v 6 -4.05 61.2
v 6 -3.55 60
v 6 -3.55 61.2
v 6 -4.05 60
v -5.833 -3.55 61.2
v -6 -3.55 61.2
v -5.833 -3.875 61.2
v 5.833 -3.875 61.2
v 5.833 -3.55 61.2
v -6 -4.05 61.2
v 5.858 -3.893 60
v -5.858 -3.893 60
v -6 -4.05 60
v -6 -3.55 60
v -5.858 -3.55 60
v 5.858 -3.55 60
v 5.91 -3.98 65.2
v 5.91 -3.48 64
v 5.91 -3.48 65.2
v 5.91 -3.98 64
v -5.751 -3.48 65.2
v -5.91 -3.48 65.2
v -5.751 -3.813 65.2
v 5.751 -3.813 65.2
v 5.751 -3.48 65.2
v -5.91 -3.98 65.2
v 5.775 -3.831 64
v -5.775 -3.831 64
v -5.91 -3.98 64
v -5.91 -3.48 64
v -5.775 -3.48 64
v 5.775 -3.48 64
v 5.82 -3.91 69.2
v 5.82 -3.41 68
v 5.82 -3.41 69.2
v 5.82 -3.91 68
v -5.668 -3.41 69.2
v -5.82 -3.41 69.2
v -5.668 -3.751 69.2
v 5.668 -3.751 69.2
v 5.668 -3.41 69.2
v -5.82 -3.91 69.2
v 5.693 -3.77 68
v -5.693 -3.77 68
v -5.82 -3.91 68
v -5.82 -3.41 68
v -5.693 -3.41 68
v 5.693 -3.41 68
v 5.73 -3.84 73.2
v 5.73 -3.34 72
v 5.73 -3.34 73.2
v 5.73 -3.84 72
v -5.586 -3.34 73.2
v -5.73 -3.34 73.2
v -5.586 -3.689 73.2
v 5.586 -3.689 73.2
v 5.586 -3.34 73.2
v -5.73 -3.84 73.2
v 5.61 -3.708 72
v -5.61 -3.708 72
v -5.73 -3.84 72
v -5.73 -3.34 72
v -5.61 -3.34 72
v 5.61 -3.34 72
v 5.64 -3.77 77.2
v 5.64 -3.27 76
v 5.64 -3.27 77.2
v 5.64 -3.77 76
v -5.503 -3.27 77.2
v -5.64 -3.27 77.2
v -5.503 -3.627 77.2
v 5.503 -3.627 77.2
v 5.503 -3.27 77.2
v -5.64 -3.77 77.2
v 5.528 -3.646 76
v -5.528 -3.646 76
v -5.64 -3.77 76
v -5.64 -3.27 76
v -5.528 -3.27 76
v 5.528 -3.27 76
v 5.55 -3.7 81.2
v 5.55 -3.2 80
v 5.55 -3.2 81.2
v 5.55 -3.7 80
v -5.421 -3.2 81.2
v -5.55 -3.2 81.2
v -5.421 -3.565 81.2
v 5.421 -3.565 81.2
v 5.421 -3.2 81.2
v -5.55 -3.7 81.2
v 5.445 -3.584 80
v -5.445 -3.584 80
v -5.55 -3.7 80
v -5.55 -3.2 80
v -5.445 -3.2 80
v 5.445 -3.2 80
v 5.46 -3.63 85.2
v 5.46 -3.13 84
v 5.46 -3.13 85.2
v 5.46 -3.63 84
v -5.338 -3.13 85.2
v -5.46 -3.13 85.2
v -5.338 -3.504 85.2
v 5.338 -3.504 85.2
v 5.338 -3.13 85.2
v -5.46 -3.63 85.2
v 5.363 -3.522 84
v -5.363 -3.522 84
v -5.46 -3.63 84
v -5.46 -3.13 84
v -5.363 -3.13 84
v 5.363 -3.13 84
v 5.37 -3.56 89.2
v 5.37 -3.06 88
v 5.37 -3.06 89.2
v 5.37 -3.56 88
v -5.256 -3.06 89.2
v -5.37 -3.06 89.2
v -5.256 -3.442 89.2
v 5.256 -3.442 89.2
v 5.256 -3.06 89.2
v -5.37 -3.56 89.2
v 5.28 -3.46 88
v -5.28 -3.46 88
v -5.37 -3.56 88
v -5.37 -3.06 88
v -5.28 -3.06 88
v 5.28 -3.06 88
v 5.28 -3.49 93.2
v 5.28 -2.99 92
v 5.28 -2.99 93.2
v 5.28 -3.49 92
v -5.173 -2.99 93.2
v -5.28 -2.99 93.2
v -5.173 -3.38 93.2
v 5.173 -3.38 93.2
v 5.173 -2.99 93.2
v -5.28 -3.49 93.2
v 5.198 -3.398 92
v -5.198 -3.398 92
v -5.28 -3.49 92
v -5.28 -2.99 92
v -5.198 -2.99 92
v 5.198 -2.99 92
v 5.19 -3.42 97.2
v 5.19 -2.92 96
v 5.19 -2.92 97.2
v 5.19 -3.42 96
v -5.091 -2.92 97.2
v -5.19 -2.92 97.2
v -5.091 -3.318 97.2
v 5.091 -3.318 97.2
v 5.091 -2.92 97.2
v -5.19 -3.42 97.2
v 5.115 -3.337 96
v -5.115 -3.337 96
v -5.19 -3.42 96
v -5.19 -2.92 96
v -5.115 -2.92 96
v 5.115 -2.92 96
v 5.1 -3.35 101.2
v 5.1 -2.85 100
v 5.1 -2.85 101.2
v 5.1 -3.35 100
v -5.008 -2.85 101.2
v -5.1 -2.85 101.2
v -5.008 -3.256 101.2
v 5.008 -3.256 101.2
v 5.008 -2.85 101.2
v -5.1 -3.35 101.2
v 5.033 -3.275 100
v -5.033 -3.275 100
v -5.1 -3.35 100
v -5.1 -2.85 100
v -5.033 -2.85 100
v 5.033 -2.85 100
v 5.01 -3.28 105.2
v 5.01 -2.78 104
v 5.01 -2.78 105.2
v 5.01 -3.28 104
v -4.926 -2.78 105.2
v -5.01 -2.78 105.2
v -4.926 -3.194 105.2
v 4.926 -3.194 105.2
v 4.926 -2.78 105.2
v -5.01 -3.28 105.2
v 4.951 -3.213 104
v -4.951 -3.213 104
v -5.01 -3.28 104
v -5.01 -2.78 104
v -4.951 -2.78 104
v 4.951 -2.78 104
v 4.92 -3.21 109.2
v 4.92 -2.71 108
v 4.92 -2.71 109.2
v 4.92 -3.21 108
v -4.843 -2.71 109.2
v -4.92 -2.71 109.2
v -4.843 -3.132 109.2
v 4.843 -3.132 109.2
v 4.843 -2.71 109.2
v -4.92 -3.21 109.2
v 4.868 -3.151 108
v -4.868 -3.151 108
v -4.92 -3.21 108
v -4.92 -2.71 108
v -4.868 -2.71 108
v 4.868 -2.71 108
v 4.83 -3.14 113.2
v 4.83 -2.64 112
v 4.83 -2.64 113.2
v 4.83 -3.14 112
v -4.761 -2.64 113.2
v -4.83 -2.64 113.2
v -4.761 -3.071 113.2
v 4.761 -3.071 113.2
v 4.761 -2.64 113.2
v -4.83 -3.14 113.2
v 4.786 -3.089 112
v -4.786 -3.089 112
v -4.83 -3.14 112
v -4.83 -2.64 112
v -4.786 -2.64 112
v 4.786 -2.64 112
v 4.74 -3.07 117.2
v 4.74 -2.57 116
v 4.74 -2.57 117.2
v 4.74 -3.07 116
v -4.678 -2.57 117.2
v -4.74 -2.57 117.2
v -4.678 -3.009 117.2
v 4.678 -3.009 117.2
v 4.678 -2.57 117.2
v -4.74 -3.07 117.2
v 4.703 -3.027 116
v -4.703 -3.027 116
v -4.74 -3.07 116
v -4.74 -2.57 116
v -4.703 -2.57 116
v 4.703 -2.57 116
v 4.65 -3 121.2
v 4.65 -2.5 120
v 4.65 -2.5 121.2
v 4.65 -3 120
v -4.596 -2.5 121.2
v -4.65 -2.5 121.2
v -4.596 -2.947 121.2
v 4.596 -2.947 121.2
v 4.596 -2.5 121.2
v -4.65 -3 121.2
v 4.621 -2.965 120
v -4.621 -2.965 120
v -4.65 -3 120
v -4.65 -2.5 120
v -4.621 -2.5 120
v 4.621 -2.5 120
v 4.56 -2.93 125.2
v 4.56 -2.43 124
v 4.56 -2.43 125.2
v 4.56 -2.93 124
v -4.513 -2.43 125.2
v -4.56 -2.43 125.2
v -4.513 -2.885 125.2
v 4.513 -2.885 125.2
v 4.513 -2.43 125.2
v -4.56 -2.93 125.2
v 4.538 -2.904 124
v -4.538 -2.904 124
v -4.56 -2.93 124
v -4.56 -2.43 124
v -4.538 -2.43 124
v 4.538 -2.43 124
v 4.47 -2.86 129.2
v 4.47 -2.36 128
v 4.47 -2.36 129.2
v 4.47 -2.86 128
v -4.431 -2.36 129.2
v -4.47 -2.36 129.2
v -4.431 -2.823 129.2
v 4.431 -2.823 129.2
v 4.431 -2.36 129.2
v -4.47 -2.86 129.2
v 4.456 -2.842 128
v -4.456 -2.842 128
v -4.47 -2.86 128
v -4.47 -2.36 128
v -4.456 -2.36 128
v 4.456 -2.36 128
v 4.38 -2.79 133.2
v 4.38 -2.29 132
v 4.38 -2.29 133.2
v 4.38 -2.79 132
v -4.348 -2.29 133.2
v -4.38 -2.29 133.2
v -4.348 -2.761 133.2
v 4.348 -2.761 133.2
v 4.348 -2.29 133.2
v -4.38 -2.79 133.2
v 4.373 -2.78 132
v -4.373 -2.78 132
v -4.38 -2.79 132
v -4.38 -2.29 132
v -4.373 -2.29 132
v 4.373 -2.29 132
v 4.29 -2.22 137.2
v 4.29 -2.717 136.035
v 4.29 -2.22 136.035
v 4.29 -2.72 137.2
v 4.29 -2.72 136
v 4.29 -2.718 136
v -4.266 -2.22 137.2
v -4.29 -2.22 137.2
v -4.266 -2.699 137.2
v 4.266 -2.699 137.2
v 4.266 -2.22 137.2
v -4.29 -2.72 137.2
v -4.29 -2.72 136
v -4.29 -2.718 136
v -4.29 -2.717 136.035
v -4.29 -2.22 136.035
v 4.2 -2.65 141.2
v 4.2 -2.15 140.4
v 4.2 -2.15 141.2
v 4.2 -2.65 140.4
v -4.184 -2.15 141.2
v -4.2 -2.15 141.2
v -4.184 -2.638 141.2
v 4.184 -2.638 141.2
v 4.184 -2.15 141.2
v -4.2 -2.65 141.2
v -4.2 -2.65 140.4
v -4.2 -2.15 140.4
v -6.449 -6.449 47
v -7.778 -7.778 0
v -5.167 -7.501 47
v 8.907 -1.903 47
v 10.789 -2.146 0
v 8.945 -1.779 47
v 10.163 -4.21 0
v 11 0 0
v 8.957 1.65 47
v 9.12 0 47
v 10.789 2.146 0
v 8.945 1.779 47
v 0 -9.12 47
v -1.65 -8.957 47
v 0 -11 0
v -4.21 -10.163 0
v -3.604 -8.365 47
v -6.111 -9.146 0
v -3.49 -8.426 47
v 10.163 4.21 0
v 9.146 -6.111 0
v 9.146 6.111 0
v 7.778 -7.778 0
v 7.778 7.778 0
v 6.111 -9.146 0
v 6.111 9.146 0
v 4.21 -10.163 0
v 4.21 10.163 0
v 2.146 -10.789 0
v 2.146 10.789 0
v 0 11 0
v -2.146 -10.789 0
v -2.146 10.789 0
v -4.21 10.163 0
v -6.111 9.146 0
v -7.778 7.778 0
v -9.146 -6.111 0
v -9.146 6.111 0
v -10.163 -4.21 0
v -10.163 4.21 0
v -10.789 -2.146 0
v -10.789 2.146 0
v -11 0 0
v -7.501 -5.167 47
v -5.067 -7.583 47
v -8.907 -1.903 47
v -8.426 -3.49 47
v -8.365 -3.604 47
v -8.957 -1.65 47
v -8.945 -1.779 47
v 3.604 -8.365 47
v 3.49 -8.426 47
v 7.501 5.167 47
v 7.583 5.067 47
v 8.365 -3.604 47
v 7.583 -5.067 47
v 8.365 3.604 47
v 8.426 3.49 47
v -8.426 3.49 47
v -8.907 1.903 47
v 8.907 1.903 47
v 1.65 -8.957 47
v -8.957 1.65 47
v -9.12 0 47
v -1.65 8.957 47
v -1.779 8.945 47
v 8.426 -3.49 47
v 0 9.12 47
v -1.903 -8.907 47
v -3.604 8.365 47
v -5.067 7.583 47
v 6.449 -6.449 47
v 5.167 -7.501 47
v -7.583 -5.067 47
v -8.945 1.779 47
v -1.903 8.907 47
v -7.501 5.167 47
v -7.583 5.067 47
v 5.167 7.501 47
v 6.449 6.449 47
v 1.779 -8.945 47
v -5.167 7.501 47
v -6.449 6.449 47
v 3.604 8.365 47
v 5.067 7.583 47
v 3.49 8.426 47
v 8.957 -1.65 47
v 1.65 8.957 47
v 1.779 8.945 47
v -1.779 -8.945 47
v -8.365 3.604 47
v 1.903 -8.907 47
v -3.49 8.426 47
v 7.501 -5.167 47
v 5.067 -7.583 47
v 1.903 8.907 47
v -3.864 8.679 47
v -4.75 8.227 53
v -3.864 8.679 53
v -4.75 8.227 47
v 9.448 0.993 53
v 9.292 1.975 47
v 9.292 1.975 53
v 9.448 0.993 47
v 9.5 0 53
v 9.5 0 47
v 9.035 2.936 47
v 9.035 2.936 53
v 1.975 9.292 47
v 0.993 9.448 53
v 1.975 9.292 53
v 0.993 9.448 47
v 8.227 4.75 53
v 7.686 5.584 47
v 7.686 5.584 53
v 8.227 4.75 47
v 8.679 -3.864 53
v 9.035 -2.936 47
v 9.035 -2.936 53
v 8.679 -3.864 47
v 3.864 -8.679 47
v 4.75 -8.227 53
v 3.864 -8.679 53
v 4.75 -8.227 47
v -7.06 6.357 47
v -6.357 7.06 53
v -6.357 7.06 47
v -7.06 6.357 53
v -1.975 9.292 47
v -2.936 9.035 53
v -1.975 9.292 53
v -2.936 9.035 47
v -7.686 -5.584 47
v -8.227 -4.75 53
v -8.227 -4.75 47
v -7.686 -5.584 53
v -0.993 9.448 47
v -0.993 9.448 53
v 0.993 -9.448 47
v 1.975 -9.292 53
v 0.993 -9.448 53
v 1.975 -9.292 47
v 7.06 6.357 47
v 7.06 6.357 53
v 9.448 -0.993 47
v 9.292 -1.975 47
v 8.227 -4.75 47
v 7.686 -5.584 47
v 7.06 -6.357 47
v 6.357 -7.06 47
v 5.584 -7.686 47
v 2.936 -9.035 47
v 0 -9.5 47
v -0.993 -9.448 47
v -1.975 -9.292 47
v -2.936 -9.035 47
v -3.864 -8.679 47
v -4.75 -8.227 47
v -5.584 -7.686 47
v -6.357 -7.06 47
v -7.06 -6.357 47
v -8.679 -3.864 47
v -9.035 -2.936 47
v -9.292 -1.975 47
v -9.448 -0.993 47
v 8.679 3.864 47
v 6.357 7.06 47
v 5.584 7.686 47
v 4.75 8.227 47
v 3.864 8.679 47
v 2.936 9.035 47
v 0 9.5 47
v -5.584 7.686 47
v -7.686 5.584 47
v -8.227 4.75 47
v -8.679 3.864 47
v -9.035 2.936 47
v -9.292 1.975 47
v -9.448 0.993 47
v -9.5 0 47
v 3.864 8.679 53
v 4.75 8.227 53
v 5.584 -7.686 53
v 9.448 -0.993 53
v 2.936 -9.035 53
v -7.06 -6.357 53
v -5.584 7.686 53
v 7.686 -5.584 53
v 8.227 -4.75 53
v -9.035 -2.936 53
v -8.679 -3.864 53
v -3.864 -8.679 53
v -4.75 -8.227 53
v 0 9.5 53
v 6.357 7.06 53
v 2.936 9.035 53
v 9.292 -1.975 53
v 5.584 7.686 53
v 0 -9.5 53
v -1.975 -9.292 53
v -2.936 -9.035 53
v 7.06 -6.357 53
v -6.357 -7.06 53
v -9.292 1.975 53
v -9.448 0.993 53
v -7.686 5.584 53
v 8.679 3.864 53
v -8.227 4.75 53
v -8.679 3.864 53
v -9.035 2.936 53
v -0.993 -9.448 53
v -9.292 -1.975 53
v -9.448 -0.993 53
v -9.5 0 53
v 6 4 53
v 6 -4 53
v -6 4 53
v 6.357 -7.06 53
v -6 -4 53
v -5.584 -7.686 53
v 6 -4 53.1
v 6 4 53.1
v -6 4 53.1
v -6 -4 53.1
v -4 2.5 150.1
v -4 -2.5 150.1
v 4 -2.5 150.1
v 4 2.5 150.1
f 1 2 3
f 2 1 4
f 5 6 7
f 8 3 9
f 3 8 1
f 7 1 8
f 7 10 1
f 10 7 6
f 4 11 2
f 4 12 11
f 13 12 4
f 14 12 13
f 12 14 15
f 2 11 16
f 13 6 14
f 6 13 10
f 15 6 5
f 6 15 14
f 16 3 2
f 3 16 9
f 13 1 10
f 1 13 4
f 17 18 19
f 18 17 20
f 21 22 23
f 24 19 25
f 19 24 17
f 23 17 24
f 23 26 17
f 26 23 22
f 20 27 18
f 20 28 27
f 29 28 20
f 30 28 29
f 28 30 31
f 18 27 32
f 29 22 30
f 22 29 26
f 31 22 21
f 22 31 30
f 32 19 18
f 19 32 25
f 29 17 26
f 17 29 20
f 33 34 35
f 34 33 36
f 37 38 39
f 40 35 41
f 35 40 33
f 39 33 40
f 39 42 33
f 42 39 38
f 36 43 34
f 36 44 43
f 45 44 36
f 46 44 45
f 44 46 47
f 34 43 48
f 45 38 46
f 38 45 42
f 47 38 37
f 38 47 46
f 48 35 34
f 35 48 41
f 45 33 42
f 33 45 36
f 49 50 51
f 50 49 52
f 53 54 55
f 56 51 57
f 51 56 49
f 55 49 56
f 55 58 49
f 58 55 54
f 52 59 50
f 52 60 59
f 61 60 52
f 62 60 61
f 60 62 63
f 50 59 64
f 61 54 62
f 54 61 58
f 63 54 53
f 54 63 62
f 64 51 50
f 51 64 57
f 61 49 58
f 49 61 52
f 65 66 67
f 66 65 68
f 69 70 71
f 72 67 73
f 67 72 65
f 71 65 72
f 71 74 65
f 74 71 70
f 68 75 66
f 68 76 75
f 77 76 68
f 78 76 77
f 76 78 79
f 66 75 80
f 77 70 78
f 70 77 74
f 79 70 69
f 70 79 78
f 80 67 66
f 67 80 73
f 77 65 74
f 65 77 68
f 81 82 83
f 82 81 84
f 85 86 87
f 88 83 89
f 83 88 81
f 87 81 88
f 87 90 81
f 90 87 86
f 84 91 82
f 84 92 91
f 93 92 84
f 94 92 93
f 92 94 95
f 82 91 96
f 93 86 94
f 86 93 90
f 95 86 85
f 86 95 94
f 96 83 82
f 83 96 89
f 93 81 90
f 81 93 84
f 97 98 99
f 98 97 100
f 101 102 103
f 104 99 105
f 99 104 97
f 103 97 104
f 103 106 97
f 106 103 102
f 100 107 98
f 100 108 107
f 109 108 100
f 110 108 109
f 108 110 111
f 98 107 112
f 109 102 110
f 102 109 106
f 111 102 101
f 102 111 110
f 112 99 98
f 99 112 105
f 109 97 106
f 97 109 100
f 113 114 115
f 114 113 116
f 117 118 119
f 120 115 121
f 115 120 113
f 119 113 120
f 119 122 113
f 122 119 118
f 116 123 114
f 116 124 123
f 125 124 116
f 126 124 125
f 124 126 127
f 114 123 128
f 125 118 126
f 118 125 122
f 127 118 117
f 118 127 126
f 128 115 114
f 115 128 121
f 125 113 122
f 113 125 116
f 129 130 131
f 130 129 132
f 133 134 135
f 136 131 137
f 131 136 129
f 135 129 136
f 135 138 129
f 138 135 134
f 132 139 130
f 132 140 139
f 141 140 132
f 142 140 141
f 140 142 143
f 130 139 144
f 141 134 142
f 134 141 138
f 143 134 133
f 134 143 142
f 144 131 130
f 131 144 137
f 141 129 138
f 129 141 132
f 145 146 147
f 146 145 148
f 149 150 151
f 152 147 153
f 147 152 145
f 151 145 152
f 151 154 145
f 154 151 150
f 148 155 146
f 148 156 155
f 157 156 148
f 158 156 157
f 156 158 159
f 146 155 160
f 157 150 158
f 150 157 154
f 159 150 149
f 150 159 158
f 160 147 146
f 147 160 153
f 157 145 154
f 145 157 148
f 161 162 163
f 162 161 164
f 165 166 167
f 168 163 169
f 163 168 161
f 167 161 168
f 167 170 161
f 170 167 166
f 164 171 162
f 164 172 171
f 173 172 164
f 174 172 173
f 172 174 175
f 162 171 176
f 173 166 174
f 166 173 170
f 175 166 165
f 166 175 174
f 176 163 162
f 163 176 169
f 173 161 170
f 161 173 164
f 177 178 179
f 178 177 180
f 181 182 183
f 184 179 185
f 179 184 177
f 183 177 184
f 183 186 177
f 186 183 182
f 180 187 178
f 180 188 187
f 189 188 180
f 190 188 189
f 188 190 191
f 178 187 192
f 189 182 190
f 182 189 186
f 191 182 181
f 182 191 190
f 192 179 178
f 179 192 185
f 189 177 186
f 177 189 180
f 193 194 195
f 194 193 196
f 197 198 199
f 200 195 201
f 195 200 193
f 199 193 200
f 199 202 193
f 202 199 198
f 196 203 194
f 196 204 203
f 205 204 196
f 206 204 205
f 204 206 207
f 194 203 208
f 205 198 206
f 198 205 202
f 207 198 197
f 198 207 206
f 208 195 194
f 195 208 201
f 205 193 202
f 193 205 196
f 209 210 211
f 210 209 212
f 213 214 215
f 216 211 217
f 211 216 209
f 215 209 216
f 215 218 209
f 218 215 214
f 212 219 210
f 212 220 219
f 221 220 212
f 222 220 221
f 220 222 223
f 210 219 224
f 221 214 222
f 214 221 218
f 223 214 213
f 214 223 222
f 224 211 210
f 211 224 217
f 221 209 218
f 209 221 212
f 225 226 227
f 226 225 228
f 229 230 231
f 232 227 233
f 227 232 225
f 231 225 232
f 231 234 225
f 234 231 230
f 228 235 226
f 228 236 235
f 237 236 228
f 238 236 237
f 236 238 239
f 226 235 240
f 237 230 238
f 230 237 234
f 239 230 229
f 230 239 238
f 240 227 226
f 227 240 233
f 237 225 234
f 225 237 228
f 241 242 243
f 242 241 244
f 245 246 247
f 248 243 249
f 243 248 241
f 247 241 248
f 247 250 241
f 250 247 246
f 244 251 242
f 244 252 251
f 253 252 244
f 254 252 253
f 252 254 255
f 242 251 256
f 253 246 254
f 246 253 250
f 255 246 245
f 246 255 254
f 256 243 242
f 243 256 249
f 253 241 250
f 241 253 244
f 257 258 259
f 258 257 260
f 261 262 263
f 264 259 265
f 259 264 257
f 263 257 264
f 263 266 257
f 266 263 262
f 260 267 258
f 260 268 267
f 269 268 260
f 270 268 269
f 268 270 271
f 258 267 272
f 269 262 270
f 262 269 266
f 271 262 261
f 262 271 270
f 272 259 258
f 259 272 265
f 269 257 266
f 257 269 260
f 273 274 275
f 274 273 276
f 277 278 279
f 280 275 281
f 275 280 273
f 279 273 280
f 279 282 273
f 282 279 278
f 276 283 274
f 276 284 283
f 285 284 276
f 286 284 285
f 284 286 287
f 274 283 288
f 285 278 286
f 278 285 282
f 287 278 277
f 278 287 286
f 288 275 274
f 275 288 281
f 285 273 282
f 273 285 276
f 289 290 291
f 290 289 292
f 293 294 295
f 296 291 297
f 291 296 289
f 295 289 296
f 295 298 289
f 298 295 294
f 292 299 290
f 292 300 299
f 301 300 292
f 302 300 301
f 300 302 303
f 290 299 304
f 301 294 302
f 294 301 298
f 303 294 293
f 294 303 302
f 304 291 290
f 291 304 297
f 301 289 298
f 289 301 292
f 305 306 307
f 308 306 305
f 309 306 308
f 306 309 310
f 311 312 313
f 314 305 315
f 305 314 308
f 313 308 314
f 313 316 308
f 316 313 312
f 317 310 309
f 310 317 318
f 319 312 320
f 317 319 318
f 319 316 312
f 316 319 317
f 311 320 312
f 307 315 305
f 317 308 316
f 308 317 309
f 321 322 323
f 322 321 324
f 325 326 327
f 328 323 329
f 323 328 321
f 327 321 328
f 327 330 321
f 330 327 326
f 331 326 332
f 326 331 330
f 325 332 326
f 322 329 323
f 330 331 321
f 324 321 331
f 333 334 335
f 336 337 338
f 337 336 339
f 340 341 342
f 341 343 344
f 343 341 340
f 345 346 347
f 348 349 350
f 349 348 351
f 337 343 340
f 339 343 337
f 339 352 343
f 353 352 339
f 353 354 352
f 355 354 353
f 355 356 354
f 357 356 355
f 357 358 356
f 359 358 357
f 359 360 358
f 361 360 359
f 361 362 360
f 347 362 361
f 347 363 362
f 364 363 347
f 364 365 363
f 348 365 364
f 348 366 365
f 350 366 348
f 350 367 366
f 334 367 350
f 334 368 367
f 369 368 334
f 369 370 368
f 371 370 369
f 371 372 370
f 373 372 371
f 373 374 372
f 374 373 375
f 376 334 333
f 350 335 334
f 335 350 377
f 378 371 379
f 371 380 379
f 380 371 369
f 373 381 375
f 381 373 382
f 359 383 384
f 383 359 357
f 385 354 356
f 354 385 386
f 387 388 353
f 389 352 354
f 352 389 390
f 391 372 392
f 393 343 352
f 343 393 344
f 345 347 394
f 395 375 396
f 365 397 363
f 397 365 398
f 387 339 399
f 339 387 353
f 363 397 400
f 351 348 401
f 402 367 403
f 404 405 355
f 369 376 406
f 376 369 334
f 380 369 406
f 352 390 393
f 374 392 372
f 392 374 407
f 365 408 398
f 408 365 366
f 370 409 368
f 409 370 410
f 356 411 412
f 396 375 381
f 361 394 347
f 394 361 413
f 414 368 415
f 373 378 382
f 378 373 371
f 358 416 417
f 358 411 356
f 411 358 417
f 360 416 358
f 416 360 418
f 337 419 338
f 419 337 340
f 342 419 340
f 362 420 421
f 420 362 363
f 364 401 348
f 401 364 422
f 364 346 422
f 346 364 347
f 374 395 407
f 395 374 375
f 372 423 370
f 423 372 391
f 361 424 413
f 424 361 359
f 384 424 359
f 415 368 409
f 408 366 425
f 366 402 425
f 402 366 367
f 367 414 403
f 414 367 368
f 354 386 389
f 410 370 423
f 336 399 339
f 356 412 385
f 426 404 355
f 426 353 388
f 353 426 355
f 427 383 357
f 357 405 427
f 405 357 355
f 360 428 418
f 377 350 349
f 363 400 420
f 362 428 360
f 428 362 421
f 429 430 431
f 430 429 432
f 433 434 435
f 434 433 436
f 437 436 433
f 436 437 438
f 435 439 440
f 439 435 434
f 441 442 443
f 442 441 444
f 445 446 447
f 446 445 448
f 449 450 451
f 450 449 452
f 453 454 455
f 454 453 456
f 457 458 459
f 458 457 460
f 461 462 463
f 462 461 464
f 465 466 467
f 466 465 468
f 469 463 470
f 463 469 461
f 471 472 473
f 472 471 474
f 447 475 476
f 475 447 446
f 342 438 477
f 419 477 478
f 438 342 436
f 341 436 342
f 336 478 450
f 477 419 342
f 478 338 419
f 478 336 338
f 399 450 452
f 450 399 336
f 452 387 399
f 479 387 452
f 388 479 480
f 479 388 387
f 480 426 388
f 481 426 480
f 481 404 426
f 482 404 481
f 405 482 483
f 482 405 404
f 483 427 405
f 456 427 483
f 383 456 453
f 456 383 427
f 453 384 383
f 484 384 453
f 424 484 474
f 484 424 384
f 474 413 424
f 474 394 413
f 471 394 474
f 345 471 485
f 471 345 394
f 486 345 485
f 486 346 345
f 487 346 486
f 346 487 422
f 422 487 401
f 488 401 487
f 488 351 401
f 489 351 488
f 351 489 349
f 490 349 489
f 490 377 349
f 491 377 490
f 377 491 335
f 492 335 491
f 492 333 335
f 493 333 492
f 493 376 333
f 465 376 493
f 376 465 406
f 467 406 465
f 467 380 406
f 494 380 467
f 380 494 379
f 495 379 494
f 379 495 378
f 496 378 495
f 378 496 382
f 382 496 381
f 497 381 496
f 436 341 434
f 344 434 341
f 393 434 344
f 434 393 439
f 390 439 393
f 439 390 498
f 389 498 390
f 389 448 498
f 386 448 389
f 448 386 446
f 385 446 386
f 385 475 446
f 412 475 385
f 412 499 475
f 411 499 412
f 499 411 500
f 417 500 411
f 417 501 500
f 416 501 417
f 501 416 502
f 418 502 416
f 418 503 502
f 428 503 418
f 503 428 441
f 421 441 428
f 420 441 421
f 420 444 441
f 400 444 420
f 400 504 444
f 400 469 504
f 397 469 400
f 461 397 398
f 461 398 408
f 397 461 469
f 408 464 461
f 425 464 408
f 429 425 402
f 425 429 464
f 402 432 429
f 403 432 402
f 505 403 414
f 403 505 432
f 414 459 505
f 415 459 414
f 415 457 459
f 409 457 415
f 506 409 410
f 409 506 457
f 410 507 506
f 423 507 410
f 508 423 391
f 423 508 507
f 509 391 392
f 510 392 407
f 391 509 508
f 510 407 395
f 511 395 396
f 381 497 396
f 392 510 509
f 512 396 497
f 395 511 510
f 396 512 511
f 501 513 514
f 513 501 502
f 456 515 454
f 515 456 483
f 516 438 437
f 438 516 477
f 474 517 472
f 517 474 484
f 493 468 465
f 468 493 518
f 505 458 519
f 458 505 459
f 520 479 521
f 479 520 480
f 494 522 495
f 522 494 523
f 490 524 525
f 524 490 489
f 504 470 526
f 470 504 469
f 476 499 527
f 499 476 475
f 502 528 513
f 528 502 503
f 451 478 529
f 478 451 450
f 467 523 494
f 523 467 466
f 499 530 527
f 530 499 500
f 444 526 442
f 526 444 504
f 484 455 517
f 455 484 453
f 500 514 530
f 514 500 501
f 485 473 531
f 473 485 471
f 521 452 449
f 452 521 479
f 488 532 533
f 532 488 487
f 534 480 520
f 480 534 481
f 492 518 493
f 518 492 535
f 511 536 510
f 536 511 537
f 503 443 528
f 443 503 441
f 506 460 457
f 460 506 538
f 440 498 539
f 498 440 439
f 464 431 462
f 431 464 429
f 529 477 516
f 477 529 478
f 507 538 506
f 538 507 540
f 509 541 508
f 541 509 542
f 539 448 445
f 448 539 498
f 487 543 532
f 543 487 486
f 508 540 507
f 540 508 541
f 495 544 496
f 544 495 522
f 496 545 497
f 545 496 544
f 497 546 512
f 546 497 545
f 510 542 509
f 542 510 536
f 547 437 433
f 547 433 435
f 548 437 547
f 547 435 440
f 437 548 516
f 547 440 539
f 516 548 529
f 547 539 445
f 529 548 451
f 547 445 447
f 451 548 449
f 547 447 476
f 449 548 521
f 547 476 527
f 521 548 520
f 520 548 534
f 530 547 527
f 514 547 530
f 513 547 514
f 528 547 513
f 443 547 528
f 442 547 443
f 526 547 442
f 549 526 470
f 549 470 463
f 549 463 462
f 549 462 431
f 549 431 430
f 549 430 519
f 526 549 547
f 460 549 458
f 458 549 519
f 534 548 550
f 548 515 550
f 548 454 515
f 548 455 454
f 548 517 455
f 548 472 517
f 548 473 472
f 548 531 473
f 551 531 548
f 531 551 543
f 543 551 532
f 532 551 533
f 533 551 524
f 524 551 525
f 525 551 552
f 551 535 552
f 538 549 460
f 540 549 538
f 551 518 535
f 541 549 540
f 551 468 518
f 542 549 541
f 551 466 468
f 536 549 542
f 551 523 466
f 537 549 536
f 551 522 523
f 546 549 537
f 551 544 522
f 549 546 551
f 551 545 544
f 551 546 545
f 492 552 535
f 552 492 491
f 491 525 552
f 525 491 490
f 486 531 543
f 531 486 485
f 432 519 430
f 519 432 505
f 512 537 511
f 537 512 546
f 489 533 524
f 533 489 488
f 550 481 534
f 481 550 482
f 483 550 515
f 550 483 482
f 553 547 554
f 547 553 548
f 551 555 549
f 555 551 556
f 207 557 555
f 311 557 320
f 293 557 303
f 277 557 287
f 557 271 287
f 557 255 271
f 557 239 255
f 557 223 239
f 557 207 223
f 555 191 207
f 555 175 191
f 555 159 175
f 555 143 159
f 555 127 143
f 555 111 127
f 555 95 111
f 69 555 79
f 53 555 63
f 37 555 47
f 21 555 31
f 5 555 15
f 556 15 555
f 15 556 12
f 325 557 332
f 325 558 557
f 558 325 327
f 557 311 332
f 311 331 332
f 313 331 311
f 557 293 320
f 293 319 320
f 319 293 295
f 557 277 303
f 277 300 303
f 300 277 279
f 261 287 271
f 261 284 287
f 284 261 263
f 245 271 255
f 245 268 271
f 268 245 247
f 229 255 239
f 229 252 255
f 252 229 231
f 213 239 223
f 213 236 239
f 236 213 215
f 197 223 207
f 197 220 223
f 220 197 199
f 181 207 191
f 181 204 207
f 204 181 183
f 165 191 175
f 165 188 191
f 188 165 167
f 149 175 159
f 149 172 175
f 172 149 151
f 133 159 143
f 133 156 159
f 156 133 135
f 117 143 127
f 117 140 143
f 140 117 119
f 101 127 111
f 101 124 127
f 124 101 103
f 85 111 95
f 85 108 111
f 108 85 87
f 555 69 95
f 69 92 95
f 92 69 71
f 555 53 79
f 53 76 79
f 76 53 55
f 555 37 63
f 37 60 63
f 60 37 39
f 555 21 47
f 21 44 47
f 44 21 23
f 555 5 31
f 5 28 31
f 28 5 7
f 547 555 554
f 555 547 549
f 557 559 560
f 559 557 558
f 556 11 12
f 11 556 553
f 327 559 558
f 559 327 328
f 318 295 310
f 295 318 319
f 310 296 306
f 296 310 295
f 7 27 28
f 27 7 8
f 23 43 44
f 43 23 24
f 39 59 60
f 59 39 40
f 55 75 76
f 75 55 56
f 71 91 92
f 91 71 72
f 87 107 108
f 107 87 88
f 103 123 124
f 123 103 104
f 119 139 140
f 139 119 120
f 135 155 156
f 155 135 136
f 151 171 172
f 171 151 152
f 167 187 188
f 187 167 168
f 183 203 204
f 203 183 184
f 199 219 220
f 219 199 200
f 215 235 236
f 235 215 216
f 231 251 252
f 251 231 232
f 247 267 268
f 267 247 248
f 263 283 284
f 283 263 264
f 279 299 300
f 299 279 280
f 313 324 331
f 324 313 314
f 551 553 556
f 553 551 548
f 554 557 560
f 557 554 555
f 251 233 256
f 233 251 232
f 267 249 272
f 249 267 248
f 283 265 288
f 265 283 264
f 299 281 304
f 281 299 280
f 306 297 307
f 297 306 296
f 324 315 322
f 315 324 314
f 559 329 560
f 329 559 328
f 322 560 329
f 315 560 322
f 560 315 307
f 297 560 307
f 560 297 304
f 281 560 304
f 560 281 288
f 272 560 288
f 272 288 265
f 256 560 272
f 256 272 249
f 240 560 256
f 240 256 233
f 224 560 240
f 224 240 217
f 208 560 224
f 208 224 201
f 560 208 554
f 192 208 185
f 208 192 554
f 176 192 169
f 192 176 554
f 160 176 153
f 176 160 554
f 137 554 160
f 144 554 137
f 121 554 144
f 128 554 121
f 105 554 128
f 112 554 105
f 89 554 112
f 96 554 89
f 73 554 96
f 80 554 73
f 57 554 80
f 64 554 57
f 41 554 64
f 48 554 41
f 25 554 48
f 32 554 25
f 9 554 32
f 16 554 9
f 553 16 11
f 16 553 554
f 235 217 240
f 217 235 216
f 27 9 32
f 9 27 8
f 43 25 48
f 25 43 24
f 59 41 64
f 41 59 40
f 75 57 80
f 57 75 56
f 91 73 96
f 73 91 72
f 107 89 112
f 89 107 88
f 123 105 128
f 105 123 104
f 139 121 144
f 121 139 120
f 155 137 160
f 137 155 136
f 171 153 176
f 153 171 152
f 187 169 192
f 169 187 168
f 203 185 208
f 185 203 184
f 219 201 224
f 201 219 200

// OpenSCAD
// file: _common.scad
// mechanism 共用設定 + 齒輪 module
$fn = 60;

// 簡化齒輪：N 個齒、節圓半徑 r、齒高 h、齒寬 w
module simple_gear(N = 16, r = 20, h = 4, thick = 6) {
  union() {
    // 主圓盤
    cylinder(h = thick, r = r, center = true);
    // 齒（梯形）
    for (i = [0:N-1]) {
      rotate([0, 0, i * 360 / N])
        translate([r, 0, 0])
          linear_extrude(height = thick, center = true)
            polygon([[0, -2.4], [h, -1.4], [h, 1.4], [0, 2.4]]);
    }
    // 中心凸軸
    cylinder(h = thick * 1.4, r = r * 0.18, center = true);
  }
}
// main file
// 銼刀 File — 木柄 + 銼齒鋼身（平銼）
include <_common.scad>

// 木柄（圓錐握把）
color([0.62, 0.27, 0.12])
  cylinder(h = 50, r1 = 11, r2 = 9, $fn = 32);

// 金屬箍（柄口）：2026-10 修正：原本把莖部畫在柄外；實物莖部插在木柄裡，柄口有金屬箍
color([0.55, 0.55, 0.55])
  translate([0, 0, 47]) cylinder(h = 6, r = 9.5);

// 銼身（平銼：往前端逐漸變窄、變薄，帶銼齒紋）
color([0.65, 0.65, 0.7])
  hull() {
    translate([-6, -4, 53]) cube([12, 8, 0.1]);
    translate([-4, -2.5, 150]) cube([8, 5, 0.1]);
  }
// 銼齒（淺溝紋一排）
color([0.45, 0.45, 0.50])
  for (i = [0:20]) translate([-6 + i * 0.09, -4.05 + i * 0.07, 60 + i*4]) cube([12 - i * 0.18, 0.5, 1.2]);
